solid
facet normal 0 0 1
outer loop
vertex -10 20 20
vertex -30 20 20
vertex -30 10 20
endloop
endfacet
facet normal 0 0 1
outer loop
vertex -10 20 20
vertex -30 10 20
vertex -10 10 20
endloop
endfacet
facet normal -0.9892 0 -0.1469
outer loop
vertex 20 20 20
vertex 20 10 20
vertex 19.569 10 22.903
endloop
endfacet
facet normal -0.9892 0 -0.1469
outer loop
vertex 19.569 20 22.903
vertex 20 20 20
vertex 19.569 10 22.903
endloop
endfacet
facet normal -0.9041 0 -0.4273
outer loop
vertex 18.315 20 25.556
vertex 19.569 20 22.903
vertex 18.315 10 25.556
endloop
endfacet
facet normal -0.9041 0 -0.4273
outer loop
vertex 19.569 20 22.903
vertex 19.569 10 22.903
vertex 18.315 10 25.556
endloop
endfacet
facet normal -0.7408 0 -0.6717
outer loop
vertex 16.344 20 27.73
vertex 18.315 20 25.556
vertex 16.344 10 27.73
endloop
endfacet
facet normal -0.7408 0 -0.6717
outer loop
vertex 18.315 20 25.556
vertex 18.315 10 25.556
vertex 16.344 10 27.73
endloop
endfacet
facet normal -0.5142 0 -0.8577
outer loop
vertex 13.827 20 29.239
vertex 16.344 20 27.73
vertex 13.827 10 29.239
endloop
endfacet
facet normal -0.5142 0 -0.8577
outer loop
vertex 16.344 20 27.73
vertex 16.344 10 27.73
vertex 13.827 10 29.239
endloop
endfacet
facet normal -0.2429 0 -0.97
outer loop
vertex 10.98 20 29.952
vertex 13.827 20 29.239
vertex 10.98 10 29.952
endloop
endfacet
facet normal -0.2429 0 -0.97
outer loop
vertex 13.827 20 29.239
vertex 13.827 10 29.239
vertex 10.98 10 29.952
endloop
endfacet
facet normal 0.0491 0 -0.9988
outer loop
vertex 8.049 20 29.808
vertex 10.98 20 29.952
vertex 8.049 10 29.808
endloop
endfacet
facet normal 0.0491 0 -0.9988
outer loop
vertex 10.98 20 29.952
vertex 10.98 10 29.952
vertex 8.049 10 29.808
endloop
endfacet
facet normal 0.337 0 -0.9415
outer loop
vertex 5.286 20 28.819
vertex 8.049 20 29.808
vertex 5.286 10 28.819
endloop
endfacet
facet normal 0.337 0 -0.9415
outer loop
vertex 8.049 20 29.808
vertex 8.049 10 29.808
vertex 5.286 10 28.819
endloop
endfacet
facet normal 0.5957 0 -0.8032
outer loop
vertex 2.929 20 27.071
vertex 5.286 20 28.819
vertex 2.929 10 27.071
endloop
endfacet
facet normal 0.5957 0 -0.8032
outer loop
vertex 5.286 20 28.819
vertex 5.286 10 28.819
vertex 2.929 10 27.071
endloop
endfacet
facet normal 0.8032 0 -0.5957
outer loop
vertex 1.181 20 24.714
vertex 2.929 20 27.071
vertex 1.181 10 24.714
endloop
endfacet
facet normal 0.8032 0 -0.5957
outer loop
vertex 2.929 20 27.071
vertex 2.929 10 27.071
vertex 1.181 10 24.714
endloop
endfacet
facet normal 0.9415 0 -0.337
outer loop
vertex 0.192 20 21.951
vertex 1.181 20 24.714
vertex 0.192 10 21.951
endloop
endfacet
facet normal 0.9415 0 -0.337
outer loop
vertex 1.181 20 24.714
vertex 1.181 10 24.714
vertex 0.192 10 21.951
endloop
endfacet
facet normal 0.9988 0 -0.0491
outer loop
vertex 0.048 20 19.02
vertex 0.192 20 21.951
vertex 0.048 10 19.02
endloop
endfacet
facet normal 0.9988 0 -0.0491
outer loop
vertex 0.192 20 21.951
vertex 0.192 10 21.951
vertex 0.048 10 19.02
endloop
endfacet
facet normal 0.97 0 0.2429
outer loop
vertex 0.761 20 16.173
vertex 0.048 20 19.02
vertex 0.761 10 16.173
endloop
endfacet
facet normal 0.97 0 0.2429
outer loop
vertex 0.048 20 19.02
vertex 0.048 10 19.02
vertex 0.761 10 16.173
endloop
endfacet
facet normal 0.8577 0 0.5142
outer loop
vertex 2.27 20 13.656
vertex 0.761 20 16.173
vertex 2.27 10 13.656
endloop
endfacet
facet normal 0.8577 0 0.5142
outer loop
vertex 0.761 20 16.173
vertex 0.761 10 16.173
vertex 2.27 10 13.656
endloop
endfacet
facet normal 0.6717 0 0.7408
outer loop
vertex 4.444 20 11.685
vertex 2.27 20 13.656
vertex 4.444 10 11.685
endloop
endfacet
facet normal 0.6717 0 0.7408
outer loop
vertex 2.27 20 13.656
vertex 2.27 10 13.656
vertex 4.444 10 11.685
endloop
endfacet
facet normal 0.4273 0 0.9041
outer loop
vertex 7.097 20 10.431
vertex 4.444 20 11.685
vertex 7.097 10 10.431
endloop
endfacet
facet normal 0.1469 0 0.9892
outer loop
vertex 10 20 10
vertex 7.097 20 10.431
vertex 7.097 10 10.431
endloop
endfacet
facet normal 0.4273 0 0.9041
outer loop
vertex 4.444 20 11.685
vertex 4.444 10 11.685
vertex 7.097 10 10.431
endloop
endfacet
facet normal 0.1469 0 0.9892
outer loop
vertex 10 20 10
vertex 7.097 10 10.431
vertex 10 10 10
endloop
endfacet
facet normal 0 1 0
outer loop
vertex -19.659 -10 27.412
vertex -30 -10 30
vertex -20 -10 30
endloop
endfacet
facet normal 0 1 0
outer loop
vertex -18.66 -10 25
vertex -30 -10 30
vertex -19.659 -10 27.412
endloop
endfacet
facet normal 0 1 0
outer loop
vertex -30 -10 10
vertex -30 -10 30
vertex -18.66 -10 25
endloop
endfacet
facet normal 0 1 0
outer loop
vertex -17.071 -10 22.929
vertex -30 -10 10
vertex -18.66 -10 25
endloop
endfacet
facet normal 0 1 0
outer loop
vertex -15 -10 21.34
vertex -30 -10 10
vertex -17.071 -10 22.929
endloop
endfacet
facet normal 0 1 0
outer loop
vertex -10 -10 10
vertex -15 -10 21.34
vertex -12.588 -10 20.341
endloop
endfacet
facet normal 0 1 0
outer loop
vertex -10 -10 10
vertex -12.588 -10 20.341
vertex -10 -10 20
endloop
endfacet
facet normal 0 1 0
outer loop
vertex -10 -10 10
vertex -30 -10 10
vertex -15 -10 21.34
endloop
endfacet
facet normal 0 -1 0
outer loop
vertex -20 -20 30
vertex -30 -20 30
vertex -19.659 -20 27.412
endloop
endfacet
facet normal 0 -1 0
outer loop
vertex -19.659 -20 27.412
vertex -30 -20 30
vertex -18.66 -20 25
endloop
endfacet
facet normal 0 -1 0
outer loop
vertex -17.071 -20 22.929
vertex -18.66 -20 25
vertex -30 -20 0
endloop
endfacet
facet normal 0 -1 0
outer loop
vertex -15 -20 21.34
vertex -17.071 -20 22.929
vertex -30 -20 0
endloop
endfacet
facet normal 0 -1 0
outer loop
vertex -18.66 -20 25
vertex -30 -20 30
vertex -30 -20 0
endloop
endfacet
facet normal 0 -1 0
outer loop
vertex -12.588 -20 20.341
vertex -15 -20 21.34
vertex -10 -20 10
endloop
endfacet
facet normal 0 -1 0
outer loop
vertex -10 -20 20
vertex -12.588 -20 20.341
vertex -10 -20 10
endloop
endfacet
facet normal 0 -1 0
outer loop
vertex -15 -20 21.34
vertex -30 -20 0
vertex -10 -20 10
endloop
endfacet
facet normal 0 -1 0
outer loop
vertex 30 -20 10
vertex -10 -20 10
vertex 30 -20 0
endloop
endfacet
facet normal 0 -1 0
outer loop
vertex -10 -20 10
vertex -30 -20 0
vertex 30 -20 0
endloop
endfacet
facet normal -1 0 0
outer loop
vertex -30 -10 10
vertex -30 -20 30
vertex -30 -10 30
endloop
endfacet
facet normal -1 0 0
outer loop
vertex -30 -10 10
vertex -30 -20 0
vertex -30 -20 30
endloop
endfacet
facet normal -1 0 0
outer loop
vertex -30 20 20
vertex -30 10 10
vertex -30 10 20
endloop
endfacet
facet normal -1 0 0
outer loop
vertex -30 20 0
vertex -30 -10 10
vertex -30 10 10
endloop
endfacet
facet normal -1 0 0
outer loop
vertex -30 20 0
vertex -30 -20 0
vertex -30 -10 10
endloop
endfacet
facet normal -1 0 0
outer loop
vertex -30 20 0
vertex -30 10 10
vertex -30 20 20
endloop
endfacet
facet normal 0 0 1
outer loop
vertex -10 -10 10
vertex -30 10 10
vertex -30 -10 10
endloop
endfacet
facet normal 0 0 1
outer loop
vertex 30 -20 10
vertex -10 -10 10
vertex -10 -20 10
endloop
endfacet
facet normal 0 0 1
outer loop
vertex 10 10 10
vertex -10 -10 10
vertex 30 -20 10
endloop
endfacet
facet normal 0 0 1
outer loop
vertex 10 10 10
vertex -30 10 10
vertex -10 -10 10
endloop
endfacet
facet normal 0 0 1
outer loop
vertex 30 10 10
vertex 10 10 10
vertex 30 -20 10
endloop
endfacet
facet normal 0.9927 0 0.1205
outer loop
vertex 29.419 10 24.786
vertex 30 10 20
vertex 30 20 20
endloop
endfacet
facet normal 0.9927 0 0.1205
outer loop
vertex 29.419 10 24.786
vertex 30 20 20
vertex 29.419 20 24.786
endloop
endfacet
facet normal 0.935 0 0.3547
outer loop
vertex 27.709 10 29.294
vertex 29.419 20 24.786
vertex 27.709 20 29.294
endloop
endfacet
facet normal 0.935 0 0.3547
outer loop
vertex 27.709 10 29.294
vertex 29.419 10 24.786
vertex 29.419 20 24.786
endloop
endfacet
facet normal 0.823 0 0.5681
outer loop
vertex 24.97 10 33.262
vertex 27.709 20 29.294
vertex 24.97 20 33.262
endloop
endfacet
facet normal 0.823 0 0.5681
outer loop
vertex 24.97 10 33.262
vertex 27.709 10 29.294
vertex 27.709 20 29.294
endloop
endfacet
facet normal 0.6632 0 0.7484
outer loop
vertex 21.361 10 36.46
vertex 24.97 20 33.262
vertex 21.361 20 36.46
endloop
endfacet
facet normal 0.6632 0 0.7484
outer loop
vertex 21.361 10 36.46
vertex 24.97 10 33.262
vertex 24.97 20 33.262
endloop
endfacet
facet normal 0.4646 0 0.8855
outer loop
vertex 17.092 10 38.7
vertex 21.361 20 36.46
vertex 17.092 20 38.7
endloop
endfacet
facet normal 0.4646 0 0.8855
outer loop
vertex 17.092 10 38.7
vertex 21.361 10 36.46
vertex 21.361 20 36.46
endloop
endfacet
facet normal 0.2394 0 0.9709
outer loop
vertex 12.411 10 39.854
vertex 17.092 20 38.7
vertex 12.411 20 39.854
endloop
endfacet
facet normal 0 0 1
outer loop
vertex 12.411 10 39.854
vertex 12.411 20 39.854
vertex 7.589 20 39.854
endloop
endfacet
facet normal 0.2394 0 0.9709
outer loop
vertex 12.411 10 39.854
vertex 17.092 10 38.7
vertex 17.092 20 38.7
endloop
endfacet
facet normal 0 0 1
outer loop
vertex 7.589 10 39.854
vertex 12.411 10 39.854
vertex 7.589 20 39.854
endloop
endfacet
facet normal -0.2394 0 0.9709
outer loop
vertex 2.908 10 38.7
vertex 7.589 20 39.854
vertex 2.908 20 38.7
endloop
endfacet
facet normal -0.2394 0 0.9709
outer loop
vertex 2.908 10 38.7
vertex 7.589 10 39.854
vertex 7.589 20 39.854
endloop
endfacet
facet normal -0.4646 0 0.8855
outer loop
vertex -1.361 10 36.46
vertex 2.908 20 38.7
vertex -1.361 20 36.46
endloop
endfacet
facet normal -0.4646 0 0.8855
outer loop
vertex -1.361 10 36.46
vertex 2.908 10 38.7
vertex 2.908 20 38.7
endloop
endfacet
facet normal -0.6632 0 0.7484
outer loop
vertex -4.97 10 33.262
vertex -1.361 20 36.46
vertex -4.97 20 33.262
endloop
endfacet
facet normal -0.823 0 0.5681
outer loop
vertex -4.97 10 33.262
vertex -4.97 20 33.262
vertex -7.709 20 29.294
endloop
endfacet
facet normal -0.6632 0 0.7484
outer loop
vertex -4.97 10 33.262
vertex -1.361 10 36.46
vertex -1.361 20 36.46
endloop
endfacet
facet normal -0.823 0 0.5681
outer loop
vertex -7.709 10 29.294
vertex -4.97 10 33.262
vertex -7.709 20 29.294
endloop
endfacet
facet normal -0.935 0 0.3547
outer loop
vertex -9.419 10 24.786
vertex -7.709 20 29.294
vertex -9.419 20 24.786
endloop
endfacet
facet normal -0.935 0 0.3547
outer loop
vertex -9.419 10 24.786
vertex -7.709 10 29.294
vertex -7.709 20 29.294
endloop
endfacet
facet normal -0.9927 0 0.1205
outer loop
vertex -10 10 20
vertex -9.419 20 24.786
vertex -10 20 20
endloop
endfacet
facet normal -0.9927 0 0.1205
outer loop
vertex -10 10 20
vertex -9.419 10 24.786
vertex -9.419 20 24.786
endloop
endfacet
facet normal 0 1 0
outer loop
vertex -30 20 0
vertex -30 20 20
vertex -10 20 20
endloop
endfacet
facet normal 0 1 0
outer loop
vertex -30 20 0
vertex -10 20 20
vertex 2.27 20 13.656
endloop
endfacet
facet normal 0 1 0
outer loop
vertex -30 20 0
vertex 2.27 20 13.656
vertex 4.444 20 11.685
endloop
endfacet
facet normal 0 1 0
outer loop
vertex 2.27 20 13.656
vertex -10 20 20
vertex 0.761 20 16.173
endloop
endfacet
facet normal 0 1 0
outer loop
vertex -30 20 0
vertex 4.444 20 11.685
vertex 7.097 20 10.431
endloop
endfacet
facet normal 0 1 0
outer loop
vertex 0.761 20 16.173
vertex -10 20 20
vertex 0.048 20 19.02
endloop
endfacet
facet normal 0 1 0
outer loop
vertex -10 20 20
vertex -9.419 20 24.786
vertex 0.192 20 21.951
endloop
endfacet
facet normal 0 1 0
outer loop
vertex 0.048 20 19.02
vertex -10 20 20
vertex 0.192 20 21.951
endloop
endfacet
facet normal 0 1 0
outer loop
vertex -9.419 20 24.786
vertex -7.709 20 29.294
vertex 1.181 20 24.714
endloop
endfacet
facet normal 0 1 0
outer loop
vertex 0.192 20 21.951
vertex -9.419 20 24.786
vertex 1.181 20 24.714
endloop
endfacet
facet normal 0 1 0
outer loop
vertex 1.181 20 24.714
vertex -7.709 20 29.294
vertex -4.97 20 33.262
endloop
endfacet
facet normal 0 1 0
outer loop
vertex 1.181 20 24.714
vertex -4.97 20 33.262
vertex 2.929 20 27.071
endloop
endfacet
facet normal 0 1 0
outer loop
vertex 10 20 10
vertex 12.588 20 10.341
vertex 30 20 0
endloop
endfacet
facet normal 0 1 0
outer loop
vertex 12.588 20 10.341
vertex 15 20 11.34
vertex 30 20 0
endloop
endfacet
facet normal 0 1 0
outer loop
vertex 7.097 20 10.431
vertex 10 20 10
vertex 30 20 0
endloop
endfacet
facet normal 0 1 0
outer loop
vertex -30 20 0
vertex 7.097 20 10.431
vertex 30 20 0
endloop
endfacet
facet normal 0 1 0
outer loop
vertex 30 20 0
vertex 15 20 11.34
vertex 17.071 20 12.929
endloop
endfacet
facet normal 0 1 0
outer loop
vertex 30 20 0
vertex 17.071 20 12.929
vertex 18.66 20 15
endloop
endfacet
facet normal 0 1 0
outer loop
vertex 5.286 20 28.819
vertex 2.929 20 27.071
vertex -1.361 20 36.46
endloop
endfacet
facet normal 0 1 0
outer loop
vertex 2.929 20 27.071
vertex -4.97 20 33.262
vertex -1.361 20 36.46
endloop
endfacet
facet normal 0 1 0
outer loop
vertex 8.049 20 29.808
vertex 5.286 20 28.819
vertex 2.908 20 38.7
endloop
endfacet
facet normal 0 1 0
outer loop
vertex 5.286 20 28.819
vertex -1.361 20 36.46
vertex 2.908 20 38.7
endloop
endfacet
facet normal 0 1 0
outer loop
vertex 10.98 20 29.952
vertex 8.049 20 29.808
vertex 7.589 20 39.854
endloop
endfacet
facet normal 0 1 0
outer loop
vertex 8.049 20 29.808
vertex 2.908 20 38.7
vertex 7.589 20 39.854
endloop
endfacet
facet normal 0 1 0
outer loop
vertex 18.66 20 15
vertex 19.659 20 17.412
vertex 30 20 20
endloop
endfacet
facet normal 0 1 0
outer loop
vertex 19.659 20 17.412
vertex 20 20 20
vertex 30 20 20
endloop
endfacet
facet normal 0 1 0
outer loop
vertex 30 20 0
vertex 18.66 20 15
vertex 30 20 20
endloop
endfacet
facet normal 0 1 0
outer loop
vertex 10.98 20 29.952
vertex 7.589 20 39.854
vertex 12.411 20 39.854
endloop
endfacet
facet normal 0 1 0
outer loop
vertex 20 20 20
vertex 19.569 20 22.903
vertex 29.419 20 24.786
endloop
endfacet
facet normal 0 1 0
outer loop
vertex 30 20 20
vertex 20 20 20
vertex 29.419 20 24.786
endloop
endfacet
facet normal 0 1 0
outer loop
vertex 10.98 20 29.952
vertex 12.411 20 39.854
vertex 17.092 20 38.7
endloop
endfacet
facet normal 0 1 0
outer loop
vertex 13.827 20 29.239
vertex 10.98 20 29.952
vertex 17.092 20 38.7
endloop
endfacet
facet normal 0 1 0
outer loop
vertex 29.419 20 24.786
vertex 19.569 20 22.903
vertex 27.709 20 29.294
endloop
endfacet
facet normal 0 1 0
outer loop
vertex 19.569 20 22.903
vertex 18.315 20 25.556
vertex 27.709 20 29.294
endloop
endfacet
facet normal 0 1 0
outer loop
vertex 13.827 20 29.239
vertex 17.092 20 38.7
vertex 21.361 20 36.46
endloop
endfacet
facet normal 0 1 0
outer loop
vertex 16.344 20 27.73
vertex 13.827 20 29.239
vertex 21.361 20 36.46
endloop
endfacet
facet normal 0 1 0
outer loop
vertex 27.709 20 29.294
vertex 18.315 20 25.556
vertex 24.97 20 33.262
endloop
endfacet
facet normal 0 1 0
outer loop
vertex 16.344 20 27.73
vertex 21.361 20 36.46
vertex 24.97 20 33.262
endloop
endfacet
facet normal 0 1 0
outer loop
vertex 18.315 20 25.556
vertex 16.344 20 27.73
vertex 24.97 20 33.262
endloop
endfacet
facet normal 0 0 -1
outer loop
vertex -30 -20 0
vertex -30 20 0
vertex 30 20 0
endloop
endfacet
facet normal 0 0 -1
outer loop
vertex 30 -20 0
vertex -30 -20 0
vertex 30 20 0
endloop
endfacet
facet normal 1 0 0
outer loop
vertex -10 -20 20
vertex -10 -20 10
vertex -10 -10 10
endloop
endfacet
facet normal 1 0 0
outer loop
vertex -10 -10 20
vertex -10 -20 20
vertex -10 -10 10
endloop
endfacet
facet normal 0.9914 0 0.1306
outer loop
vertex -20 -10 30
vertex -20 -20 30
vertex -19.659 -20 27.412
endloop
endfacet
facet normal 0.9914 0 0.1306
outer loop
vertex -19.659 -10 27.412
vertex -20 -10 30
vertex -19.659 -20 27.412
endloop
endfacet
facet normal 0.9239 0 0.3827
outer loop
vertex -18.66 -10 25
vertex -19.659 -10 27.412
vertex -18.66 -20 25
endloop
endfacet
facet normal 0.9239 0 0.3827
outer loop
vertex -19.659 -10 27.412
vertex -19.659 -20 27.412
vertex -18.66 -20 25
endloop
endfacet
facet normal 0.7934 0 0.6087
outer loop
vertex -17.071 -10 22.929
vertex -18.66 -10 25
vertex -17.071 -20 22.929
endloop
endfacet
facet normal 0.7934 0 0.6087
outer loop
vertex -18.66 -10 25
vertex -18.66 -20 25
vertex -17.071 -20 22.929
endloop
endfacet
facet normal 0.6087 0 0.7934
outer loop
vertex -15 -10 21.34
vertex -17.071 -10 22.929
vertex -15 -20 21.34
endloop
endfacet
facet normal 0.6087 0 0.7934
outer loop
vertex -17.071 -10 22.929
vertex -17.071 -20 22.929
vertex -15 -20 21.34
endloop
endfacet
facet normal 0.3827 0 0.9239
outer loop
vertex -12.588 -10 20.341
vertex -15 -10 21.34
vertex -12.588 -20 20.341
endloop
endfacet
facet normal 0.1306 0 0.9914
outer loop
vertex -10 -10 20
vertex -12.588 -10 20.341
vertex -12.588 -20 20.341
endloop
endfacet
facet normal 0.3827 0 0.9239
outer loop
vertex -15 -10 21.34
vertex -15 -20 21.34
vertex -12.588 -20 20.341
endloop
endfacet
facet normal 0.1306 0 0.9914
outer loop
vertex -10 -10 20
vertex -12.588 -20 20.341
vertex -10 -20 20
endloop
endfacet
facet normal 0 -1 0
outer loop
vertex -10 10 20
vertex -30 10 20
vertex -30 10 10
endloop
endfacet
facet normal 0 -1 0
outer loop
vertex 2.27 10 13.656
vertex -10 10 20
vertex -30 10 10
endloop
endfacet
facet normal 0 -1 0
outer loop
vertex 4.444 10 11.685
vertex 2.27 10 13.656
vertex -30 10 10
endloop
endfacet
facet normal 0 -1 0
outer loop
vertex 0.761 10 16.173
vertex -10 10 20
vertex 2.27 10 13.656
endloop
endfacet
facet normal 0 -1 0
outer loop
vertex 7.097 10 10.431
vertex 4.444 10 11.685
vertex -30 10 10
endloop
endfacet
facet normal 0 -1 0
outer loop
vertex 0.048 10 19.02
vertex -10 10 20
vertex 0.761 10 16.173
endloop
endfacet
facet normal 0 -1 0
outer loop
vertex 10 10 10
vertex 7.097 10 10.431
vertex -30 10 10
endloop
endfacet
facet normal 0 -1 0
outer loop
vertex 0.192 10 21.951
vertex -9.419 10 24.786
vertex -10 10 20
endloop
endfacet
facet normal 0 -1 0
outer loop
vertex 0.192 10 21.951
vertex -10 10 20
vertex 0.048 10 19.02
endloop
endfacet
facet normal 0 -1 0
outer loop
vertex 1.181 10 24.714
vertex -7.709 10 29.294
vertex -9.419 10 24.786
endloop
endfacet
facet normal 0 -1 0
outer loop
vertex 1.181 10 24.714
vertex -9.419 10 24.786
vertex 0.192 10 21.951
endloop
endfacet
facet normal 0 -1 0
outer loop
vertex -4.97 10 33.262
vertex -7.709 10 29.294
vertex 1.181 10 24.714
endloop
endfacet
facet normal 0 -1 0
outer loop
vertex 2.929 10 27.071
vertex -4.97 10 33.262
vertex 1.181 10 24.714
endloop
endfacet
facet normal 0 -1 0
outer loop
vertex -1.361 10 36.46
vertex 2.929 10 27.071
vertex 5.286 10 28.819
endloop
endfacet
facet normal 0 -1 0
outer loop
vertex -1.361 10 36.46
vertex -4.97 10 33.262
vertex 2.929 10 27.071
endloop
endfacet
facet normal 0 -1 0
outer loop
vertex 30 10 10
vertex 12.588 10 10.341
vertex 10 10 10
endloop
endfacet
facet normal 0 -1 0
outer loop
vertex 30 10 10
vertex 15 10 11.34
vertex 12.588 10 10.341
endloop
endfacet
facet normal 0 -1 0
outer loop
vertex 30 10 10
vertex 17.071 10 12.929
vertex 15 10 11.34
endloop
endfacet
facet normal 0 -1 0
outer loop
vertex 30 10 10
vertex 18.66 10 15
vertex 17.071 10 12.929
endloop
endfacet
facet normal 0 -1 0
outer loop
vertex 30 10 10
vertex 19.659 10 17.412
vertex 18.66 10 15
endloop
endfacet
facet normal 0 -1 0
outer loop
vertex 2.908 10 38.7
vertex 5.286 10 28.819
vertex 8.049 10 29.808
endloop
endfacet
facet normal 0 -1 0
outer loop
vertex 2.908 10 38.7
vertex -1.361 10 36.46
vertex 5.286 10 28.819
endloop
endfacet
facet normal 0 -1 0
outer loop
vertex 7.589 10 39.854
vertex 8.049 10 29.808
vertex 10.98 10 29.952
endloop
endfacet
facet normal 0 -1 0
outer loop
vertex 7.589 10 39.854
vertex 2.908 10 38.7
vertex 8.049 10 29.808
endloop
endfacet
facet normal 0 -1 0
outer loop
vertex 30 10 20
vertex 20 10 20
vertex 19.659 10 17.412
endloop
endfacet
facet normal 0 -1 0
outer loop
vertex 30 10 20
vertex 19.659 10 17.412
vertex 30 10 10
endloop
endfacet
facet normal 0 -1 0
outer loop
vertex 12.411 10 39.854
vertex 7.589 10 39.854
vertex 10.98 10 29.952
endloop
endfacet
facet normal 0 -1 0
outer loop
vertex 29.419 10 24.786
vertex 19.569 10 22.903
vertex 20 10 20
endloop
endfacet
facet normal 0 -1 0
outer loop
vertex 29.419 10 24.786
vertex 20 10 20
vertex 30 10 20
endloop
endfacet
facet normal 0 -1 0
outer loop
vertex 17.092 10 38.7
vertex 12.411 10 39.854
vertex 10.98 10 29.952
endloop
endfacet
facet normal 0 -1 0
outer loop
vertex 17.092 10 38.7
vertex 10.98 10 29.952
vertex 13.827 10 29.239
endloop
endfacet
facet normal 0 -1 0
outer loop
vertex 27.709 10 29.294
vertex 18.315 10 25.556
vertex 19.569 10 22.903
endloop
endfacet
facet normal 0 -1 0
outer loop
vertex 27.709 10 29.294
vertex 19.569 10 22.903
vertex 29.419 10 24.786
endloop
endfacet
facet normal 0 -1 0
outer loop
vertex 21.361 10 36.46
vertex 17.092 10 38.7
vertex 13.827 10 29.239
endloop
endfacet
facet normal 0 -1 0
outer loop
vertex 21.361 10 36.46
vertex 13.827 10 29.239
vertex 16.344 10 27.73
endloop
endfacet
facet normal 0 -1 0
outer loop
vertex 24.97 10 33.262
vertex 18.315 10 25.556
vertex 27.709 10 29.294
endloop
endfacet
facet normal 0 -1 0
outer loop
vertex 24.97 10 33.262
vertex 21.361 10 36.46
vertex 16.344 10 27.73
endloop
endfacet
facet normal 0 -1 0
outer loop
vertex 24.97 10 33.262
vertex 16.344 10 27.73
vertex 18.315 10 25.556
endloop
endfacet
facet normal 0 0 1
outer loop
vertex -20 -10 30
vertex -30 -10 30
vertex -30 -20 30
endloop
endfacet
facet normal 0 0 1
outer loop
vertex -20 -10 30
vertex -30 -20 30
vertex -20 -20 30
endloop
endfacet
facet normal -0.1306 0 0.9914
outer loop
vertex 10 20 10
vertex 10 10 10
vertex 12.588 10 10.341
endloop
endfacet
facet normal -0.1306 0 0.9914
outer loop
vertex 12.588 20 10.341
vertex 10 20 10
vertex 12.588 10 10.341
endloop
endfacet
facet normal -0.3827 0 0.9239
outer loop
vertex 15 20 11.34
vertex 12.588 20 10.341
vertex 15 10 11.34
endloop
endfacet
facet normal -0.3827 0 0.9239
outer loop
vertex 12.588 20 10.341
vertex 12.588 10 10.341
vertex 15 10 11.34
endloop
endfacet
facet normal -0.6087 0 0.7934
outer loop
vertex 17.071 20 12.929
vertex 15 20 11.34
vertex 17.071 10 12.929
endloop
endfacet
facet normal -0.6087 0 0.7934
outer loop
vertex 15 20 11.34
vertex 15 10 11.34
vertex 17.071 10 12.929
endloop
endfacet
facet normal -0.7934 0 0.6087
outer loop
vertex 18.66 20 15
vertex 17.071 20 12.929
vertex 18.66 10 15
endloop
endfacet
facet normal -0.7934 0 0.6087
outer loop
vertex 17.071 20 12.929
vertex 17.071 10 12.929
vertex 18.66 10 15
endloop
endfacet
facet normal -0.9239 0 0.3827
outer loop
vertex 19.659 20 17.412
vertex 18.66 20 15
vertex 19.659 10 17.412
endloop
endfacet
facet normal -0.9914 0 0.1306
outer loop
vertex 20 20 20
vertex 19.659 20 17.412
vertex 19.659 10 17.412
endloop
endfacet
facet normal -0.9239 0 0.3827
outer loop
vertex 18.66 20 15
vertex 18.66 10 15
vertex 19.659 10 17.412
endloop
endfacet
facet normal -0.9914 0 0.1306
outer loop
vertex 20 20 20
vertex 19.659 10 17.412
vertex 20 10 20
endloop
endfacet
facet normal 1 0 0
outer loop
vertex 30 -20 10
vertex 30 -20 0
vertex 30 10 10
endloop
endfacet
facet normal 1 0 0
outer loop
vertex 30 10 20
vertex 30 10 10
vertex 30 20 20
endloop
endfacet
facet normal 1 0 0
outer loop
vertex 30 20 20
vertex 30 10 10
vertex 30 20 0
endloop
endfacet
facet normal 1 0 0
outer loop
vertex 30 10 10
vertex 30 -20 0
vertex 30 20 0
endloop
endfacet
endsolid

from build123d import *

# Parameters (mm, degrees)
F0_W      = 60
F0_H      = 40
F1_DEPTH  = 10
F2_W      = 60
F2_H      = 10
F3_DEPTH  = 10
F5_DEPTH  = 10
F7_DEPTH  = 10
F8_W      = 20
F8_H      = 10
F9_DEPTH  = 20
F11_DEPTH = 10


with BuildPart() as f1:
    # F0 (on Top) → F1 (new body)
    with BuildSketch(Plane.XY):
        Rectangle(F0_W, F0_H)
    extrude(amount=F1_DEPTH)

    # F2 (on face) → F3 (join)
    with BuildSketch(Plane.XY.offset(10)):
        with Locations((0, 15)):
            Rectangle(F2_W, F2_H)
    extrude(amount=F3_DEPTH)

    # F4 (on face) → F5 (join)
    with BuildSketch(Plane.XZ.offset(-10)):
        with BuildLine():
            Line((-10, 20), (30, 20))
            ThreePointArc((30, 20), (10, 40), (-10, 20))
        make_face()
    extrude(amount=-F5_DEPTH)

    # F6 (on face) → F7 (cut)
    with BuildSketch(Plane.XZ.offset(-10)):
        with BuildLine():
            ThreePointArc((10, 10), (17.071068, 12.928932), (20, 20))
            ThreePointArc((20, 20), (2.928932, 27.071068), (10, 10))
        make_face()
    extrude(amount=-F7_DEPTH, mode=Mode.SUBTRACT)

    # F8 (on face) → F9 (join)
    with BuildSketch(Plane.XY.offset(10)):
        with Locations((-20, -15)):
            Rectangle(F8_W, F8_H)
    extrude(amount=F9_DEPTH)

    # F10 (on face) → F11 (cut)
    with BuildSketch(Plane.XZ.offset(20)):
        with BuildLine():
            Line((-10, 30), (-20, 30))
            ThreePointArc((-20, 30), (-17.071068, 22.928932), (-10, 20))
            Line((-10, 20), (-10, 30))
        make_face()
    extrude(amount=-F11_DEPTH, mode=Mode.SUBTRACT)


solid = f1.part
